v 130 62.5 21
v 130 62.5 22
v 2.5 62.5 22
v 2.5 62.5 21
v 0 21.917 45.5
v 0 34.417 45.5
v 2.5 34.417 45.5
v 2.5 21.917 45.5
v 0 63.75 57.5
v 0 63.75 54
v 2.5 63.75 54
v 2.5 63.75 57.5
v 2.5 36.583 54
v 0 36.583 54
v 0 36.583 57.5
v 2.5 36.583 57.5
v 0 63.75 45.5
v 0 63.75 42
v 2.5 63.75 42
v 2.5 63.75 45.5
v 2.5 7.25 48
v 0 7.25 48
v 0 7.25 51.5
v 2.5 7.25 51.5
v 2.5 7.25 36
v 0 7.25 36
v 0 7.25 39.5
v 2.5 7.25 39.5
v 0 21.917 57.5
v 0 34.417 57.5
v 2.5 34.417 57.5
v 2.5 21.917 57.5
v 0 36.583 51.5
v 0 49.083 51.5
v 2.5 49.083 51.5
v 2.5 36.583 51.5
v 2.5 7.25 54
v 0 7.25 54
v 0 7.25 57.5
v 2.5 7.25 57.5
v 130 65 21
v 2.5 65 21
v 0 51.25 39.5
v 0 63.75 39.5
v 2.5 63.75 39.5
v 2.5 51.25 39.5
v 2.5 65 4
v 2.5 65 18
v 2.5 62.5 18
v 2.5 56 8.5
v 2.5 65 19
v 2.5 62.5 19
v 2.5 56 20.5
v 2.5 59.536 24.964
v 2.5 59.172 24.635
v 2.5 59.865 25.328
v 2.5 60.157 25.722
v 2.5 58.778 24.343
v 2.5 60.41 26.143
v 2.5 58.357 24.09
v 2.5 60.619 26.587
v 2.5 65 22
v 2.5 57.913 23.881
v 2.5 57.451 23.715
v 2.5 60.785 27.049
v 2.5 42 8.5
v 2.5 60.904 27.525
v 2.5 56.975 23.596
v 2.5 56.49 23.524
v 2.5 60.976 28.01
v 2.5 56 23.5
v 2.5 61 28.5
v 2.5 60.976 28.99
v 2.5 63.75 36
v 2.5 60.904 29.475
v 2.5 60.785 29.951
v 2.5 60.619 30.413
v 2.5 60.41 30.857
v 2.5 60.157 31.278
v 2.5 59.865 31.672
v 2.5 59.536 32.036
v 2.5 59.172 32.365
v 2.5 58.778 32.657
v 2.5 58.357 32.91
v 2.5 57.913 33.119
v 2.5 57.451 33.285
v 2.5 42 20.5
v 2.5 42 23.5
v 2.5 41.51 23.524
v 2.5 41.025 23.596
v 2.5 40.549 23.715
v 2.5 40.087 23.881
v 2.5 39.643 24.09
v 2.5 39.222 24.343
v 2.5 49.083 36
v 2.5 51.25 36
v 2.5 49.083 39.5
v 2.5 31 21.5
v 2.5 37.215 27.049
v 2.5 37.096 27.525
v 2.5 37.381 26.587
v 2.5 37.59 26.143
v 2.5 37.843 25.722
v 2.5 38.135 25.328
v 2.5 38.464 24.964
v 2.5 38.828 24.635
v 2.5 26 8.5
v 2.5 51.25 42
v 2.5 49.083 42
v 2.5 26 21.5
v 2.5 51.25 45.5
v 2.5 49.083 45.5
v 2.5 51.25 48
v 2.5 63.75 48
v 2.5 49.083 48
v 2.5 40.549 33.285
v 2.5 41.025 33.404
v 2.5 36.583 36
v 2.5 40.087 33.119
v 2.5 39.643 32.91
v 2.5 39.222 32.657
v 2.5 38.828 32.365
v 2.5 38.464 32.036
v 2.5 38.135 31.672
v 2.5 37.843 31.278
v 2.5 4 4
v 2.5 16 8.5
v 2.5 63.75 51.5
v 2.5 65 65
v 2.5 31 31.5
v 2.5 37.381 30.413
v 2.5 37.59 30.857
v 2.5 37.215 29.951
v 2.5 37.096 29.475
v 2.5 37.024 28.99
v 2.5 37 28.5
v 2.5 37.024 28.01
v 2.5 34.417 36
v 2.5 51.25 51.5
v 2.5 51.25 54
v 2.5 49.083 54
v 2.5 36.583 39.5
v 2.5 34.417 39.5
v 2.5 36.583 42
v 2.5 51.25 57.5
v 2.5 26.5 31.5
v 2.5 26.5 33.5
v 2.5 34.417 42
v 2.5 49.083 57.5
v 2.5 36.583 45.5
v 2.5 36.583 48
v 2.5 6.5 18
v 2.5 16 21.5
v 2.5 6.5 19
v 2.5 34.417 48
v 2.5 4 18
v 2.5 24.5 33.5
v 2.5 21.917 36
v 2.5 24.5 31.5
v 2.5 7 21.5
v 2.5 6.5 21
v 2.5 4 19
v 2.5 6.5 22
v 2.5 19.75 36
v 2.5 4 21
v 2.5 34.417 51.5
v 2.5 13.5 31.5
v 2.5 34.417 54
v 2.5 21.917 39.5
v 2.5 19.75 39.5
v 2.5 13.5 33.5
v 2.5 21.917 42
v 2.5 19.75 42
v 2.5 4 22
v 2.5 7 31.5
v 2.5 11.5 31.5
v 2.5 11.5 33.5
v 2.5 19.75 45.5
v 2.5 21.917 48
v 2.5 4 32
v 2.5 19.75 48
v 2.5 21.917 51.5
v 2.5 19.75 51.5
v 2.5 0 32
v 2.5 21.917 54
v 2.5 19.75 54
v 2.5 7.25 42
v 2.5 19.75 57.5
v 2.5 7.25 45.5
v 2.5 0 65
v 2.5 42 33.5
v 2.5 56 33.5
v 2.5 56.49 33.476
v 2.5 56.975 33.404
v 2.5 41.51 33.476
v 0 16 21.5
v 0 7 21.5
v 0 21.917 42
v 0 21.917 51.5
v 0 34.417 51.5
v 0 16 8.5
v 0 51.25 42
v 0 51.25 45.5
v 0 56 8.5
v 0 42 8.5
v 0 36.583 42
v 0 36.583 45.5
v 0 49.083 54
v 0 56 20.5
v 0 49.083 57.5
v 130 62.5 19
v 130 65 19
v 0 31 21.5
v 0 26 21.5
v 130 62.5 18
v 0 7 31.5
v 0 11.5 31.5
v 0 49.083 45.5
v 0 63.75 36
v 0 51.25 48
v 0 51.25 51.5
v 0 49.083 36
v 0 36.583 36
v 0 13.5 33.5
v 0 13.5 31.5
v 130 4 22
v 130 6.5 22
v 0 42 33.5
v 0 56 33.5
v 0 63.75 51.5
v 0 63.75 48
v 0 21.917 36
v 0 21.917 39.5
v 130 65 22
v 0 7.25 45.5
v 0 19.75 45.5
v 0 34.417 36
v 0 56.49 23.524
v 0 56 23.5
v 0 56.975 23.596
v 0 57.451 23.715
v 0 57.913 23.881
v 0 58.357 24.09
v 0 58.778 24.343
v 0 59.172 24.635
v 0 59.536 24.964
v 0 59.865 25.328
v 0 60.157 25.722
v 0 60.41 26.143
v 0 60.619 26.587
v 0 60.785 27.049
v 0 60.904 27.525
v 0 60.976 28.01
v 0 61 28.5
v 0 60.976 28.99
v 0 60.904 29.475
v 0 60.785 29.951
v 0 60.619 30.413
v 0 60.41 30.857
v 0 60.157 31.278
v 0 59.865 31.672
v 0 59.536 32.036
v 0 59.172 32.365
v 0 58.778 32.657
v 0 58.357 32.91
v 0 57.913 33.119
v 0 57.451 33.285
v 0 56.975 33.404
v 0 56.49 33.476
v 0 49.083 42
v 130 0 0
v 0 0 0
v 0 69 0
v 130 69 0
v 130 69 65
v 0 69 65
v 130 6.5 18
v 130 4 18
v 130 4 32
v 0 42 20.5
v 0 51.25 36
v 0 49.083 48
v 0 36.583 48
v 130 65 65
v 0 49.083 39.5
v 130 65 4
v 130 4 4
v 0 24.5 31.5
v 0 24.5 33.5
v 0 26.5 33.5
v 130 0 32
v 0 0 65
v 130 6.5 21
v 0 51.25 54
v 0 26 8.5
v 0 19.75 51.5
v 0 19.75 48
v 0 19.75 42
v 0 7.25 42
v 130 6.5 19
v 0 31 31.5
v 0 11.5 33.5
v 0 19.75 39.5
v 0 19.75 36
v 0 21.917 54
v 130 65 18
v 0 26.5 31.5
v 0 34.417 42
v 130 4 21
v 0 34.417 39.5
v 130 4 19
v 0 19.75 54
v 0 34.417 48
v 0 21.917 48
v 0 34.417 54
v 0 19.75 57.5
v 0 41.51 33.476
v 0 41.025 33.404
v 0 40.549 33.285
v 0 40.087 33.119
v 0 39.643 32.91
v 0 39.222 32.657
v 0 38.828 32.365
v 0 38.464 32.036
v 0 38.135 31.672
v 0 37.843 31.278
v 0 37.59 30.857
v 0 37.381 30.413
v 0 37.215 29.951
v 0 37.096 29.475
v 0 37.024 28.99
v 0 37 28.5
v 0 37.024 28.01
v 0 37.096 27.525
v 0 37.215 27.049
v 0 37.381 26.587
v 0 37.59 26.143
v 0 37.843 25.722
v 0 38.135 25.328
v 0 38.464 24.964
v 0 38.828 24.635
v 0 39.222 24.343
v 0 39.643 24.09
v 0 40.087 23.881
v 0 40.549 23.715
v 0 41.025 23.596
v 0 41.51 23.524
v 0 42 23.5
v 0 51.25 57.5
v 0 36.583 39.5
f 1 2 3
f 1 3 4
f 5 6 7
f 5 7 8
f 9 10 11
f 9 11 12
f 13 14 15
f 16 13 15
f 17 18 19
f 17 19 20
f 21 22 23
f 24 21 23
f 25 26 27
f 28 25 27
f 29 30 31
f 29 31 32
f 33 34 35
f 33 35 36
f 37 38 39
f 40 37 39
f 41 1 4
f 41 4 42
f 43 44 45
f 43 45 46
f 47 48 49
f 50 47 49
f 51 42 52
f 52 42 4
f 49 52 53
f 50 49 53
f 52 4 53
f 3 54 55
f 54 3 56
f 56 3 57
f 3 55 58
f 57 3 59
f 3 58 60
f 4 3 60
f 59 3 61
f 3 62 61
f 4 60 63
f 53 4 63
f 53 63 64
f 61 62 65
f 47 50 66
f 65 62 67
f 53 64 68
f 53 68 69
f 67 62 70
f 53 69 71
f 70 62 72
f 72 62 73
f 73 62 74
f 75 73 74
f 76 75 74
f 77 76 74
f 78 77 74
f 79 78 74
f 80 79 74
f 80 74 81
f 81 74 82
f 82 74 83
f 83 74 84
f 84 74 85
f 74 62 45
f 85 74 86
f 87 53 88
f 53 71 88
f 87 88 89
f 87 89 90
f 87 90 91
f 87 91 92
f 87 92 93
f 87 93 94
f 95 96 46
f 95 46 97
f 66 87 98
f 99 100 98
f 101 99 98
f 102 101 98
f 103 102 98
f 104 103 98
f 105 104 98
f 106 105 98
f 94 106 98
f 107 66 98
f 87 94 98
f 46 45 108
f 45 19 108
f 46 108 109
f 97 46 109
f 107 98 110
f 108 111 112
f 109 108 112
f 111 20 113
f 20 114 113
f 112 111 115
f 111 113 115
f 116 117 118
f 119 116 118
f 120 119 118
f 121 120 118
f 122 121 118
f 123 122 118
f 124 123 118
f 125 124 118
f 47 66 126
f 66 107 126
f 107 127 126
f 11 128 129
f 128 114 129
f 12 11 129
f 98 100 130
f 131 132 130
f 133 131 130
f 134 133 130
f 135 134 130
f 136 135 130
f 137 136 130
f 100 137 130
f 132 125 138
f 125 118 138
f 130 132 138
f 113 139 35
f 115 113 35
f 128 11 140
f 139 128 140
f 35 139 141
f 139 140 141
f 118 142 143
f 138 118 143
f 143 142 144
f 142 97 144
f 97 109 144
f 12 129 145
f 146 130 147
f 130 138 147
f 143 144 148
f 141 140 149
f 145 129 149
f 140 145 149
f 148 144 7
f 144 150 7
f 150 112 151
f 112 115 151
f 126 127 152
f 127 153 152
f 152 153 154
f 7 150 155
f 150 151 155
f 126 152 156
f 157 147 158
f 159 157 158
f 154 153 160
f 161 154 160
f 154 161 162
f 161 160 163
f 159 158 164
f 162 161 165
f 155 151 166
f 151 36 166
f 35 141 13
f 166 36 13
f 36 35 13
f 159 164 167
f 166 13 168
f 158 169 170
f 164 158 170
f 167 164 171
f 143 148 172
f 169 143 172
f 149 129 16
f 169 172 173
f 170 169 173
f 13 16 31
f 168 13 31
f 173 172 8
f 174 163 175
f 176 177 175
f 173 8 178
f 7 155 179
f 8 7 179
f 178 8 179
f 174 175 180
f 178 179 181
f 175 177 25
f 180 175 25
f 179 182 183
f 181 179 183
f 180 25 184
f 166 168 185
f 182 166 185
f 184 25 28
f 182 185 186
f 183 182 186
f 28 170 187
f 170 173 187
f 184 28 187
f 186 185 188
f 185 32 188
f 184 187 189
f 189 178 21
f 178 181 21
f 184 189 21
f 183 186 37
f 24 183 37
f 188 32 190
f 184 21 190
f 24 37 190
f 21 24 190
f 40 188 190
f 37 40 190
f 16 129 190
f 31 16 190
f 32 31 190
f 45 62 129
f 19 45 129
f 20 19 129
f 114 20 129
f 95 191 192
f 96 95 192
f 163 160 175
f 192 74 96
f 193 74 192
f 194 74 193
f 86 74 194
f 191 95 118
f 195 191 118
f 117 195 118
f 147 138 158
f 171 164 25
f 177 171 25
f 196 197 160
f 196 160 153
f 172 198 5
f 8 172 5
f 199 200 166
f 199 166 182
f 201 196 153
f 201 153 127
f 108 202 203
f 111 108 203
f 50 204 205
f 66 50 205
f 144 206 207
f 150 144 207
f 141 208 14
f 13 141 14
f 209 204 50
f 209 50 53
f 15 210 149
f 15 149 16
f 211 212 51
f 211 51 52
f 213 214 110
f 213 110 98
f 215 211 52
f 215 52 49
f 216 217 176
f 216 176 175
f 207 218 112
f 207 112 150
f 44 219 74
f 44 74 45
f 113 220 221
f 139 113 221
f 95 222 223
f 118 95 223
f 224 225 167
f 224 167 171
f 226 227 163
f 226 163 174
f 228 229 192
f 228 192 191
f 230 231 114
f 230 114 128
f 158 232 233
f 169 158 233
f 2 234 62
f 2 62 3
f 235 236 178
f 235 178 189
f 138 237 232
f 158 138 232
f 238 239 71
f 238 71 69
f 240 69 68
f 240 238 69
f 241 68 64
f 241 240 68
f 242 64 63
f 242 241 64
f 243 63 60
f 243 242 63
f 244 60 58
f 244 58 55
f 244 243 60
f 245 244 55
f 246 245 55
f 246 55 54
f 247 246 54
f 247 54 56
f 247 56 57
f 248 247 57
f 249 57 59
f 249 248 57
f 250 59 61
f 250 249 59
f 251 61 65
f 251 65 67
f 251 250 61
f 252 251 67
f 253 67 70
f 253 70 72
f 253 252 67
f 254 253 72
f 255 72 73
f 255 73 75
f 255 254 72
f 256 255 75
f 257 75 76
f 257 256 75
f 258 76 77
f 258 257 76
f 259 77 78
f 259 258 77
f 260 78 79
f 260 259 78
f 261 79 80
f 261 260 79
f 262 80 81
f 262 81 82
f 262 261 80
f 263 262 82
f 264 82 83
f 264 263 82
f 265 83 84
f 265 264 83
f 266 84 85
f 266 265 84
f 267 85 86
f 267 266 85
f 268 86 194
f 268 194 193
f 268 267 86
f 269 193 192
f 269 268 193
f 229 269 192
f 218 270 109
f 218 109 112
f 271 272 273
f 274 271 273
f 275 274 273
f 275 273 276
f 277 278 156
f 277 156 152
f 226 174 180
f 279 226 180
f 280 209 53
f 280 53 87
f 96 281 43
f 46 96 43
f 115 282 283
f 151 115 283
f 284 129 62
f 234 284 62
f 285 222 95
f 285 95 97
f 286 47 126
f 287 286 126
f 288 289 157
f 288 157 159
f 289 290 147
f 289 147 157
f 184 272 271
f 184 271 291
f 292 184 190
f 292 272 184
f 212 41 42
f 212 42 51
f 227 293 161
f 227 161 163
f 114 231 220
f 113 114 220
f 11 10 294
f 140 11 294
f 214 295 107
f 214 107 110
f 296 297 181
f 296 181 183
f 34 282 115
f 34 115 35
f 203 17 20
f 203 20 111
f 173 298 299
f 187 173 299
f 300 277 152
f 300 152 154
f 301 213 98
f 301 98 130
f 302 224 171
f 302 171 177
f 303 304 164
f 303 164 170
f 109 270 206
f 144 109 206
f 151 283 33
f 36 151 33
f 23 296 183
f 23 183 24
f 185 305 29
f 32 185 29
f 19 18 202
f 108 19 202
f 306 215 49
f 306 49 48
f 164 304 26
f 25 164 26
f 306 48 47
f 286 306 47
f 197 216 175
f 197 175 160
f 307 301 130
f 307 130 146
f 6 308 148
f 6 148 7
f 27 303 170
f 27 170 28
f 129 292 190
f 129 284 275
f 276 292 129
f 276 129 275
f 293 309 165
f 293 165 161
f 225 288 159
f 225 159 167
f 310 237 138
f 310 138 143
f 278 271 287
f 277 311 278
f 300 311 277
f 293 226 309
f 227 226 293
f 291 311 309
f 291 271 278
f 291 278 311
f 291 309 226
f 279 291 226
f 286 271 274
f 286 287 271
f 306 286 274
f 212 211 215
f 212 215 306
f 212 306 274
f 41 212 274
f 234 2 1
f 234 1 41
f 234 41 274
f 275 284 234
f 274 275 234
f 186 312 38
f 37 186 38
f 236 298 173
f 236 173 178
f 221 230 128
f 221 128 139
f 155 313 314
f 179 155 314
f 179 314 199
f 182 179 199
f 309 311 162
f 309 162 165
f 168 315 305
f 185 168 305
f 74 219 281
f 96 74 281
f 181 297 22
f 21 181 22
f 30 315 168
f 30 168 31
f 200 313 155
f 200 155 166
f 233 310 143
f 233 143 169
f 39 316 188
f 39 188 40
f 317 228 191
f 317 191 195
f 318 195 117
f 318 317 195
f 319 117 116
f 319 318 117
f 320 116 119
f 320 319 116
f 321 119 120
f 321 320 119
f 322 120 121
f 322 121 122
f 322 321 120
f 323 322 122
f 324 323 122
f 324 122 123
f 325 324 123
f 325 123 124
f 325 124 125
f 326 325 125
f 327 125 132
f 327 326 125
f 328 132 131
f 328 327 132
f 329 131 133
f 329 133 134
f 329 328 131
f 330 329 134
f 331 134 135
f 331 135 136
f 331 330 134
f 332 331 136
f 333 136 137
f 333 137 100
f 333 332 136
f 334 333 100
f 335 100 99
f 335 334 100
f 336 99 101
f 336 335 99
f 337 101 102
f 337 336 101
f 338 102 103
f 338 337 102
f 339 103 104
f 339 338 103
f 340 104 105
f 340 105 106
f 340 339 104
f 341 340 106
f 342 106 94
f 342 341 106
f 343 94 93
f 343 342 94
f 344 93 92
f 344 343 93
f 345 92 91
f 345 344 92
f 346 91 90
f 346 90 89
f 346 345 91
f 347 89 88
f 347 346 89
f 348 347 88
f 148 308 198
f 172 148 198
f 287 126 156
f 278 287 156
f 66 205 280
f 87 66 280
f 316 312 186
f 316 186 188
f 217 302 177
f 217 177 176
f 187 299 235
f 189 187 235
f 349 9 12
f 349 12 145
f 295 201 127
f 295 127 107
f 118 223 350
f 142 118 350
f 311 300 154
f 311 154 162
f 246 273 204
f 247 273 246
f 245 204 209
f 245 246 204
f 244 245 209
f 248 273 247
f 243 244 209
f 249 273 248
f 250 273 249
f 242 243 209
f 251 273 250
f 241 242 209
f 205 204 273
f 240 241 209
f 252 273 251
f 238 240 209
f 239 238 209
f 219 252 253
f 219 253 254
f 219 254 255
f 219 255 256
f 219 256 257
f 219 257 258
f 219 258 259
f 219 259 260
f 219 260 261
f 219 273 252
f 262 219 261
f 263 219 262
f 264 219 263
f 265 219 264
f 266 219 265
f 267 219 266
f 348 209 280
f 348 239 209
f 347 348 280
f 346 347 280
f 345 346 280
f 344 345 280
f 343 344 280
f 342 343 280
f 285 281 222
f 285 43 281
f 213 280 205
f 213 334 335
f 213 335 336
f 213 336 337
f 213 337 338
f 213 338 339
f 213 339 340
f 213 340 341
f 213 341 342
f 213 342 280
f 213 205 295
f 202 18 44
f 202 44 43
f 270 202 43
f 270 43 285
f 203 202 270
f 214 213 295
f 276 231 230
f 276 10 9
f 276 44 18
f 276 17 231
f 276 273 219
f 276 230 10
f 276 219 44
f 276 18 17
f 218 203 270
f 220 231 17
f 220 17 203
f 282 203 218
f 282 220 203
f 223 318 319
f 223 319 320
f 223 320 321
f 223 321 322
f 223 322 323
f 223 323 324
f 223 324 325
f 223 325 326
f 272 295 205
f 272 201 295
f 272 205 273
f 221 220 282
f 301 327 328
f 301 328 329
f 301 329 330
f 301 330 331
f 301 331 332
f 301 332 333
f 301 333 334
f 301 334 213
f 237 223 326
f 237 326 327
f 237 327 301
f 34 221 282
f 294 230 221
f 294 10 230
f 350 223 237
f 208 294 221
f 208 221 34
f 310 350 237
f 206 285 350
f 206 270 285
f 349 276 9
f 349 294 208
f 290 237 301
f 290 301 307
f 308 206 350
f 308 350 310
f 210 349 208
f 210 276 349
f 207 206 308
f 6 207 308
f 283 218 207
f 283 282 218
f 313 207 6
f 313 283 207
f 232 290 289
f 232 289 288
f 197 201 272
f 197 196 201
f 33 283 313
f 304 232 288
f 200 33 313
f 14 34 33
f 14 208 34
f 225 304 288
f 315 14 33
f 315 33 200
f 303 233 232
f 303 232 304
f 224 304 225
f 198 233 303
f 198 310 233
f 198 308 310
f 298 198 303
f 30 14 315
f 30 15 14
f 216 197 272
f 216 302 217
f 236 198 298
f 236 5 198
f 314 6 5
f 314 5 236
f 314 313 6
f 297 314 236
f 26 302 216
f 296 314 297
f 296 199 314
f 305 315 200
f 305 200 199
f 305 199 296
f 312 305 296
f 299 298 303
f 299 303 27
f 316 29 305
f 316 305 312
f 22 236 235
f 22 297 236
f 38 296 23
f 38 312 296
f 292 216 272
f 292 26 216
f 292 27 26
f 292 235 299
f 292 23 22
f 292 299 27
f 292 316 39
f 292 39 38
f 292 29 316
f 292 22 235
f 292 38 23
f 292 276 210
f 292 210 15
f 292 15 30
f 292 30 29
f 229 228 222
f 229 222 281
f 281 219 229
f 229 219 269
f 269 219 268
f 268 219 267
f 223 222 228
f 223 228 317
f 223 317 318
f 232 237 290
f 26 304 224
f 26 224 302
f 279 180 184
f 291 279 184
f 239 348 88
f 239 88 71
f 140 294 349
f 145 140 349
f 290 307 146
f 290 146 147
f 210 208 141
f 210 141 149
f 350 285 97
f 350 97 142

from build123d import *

# Parameters (mm, degrees)
F1_DEPTH = 130
F2_W     = 14
F2_H     = 12
F2_W_2   = 12.5
F2_H_2   = 3.5
F3_DEPTH = 2.5


with BuildPart() as f1:
    # F0 (on Right) → F1 (new body)
    with BuildSketch(Plane.YZ):
        Polygon((0, 32), (0, 0), (69, 0), (69, 65), (65, 65), (65, 22), (62.5, 22), (62.5, 21), (65, 21), (65, 19), (62.5, 19), (62.5, 18), (65, 18), (65, 4), (4, 4), (4, 18), (6.5, 18), (6.5, 19), (4, 19), (4, 21), (6.5, 21), (6.5, 22), (4, 22), (4, 32), align=None)
    extrude(amount=F1_DEPTH)

    # F2 (on face) → F3 (join)
    with BuildSketch(Plane(origin=(0, 0, 0), x_dir=(0, -1, 0), z_dir=(-1, 0, 0))):
        Polygon((-4, 32), (0, 32), (0, 65), (-65, 65), (-65, 22), (-62.5, 22), (-62.5, 21), (-65, 21), (-65, 19), (-62.5, 19), (-62.5, 18), (-65, 18), (-65, 4), (-4, 4), (-4, 18), (-6.5, 18), (-6.5, 19), (-4, 19), (-4, 21), (-6.5, 21), (-6.5, 22), (-4, 22), align=None)
        with Locations((-49, 14.5)):
            Rectangle(F2_W, F2_H, mode=Mode.SUBTRACT)
        with BuildLine():
            Line((-42, 23.5), (-56, 23.5))
            ThreePointArc((-56, 23.5), (-61, 28.5), (-56, 33.5))
            Line((-56, 33.5), (-42, 33.5))
            ThreePointArc((-42, 33.5), (-37, 28.5), (-42, 23.5))
        make_face(mode=Mode.SUBTRACT)
        Polygon((-11.5, 31.5), (-7, 31.5), (-7, 21.5), (-16, 21.5), (-16, 8.5), (-26, 8.5), (-26, 21.5), (-31, 21.5), (-31, 31.5), (-26.5, 31.5), (-26.5, 33.5), (-24.5, 33.5), (-24.5, 31.5), (-13.5, 31.5), (-13.5, 33.5), (-11.5, 33.5), align=None, mode=Mode.SUBTRACT)
        with Locations((-57.5, 37.75)):
            Rectangle(F2_W_2, F2_H_2, mode=Mode.SUBTRACT)
        with Locations((-57.5, 43.75)):
            Rectangle(F2_W_2, F2_H_2, mode=Mode.SUBTRACT)
        with Locations((-42.833333, 37.75)):
            Rectangle(F2_W_2, F2_H_2, mode=Mode.SUBTRACT)
        with Locations((-42.833333, 43.75)):
            Rectangle(F2_W_2, F2_H_2, mode=Mode.SUBTRACT)
        with Locations((-57.5, 49.75)):
            Rectangle(F2_W_2, F2_H_2, mode=Mode.SUBTRACT)
        with Locations((-57.5, 55.75)):
            Rectangle(F2_W_2, F2_H_2, mode=Mode.SUBTRACT)
        with Locations((-42.833333, 49.75)):
            Rectangle(F2_W_2, F2_H_2, mode=Mode.SUBTRACT)
        with Locations((-42.833333, 55.75)):
            Rectangle(F2_W_2, F2_H_2, mode=Mode.SUBTRACT)
        with Locations((-28.166667, 37.75)):
            Rectangle(F2_W_2, F2_H_2, mode=Mode.SUBTRACT)
        with Locations((-28.166667, 43.75)):
            Rectangle(F2_W_2, F2_H_2, mode=Mode.SUBTRACT)
        with Locations((-13.5, 37.75)):
            Rectangle(F2_W_2, F2_H_2, mode=Mode.SUBTRACT)
        with Locations((-13.5, 43.75)):
            Rectangle(F2_W_2, F2_H_2, mode=Mode.SUBTRACT)
        with Locations((-28.166667, 49.75)):
            Rectangle(F2_W_2, F2_H_2, mode=Mode.SUBTRACT)
        with Locations((-28.166667, 55.75)):
            Rectangle(F2_W_2, F2_H_2, mode=Mode.SUBTRACT)
        with Locations((-13.5, 49.75)):
            Rectangle(F2_W_2, F2_H_2, mode=Mode.SUBTRACT)
        with Locations((-13.5, 55.75)):
            Rectangle(F2_W_2, F2_H_2, mode=Mode.SUBTRACT)
    extrude(amount=-F3_DEPTH)


solid = f1.part
